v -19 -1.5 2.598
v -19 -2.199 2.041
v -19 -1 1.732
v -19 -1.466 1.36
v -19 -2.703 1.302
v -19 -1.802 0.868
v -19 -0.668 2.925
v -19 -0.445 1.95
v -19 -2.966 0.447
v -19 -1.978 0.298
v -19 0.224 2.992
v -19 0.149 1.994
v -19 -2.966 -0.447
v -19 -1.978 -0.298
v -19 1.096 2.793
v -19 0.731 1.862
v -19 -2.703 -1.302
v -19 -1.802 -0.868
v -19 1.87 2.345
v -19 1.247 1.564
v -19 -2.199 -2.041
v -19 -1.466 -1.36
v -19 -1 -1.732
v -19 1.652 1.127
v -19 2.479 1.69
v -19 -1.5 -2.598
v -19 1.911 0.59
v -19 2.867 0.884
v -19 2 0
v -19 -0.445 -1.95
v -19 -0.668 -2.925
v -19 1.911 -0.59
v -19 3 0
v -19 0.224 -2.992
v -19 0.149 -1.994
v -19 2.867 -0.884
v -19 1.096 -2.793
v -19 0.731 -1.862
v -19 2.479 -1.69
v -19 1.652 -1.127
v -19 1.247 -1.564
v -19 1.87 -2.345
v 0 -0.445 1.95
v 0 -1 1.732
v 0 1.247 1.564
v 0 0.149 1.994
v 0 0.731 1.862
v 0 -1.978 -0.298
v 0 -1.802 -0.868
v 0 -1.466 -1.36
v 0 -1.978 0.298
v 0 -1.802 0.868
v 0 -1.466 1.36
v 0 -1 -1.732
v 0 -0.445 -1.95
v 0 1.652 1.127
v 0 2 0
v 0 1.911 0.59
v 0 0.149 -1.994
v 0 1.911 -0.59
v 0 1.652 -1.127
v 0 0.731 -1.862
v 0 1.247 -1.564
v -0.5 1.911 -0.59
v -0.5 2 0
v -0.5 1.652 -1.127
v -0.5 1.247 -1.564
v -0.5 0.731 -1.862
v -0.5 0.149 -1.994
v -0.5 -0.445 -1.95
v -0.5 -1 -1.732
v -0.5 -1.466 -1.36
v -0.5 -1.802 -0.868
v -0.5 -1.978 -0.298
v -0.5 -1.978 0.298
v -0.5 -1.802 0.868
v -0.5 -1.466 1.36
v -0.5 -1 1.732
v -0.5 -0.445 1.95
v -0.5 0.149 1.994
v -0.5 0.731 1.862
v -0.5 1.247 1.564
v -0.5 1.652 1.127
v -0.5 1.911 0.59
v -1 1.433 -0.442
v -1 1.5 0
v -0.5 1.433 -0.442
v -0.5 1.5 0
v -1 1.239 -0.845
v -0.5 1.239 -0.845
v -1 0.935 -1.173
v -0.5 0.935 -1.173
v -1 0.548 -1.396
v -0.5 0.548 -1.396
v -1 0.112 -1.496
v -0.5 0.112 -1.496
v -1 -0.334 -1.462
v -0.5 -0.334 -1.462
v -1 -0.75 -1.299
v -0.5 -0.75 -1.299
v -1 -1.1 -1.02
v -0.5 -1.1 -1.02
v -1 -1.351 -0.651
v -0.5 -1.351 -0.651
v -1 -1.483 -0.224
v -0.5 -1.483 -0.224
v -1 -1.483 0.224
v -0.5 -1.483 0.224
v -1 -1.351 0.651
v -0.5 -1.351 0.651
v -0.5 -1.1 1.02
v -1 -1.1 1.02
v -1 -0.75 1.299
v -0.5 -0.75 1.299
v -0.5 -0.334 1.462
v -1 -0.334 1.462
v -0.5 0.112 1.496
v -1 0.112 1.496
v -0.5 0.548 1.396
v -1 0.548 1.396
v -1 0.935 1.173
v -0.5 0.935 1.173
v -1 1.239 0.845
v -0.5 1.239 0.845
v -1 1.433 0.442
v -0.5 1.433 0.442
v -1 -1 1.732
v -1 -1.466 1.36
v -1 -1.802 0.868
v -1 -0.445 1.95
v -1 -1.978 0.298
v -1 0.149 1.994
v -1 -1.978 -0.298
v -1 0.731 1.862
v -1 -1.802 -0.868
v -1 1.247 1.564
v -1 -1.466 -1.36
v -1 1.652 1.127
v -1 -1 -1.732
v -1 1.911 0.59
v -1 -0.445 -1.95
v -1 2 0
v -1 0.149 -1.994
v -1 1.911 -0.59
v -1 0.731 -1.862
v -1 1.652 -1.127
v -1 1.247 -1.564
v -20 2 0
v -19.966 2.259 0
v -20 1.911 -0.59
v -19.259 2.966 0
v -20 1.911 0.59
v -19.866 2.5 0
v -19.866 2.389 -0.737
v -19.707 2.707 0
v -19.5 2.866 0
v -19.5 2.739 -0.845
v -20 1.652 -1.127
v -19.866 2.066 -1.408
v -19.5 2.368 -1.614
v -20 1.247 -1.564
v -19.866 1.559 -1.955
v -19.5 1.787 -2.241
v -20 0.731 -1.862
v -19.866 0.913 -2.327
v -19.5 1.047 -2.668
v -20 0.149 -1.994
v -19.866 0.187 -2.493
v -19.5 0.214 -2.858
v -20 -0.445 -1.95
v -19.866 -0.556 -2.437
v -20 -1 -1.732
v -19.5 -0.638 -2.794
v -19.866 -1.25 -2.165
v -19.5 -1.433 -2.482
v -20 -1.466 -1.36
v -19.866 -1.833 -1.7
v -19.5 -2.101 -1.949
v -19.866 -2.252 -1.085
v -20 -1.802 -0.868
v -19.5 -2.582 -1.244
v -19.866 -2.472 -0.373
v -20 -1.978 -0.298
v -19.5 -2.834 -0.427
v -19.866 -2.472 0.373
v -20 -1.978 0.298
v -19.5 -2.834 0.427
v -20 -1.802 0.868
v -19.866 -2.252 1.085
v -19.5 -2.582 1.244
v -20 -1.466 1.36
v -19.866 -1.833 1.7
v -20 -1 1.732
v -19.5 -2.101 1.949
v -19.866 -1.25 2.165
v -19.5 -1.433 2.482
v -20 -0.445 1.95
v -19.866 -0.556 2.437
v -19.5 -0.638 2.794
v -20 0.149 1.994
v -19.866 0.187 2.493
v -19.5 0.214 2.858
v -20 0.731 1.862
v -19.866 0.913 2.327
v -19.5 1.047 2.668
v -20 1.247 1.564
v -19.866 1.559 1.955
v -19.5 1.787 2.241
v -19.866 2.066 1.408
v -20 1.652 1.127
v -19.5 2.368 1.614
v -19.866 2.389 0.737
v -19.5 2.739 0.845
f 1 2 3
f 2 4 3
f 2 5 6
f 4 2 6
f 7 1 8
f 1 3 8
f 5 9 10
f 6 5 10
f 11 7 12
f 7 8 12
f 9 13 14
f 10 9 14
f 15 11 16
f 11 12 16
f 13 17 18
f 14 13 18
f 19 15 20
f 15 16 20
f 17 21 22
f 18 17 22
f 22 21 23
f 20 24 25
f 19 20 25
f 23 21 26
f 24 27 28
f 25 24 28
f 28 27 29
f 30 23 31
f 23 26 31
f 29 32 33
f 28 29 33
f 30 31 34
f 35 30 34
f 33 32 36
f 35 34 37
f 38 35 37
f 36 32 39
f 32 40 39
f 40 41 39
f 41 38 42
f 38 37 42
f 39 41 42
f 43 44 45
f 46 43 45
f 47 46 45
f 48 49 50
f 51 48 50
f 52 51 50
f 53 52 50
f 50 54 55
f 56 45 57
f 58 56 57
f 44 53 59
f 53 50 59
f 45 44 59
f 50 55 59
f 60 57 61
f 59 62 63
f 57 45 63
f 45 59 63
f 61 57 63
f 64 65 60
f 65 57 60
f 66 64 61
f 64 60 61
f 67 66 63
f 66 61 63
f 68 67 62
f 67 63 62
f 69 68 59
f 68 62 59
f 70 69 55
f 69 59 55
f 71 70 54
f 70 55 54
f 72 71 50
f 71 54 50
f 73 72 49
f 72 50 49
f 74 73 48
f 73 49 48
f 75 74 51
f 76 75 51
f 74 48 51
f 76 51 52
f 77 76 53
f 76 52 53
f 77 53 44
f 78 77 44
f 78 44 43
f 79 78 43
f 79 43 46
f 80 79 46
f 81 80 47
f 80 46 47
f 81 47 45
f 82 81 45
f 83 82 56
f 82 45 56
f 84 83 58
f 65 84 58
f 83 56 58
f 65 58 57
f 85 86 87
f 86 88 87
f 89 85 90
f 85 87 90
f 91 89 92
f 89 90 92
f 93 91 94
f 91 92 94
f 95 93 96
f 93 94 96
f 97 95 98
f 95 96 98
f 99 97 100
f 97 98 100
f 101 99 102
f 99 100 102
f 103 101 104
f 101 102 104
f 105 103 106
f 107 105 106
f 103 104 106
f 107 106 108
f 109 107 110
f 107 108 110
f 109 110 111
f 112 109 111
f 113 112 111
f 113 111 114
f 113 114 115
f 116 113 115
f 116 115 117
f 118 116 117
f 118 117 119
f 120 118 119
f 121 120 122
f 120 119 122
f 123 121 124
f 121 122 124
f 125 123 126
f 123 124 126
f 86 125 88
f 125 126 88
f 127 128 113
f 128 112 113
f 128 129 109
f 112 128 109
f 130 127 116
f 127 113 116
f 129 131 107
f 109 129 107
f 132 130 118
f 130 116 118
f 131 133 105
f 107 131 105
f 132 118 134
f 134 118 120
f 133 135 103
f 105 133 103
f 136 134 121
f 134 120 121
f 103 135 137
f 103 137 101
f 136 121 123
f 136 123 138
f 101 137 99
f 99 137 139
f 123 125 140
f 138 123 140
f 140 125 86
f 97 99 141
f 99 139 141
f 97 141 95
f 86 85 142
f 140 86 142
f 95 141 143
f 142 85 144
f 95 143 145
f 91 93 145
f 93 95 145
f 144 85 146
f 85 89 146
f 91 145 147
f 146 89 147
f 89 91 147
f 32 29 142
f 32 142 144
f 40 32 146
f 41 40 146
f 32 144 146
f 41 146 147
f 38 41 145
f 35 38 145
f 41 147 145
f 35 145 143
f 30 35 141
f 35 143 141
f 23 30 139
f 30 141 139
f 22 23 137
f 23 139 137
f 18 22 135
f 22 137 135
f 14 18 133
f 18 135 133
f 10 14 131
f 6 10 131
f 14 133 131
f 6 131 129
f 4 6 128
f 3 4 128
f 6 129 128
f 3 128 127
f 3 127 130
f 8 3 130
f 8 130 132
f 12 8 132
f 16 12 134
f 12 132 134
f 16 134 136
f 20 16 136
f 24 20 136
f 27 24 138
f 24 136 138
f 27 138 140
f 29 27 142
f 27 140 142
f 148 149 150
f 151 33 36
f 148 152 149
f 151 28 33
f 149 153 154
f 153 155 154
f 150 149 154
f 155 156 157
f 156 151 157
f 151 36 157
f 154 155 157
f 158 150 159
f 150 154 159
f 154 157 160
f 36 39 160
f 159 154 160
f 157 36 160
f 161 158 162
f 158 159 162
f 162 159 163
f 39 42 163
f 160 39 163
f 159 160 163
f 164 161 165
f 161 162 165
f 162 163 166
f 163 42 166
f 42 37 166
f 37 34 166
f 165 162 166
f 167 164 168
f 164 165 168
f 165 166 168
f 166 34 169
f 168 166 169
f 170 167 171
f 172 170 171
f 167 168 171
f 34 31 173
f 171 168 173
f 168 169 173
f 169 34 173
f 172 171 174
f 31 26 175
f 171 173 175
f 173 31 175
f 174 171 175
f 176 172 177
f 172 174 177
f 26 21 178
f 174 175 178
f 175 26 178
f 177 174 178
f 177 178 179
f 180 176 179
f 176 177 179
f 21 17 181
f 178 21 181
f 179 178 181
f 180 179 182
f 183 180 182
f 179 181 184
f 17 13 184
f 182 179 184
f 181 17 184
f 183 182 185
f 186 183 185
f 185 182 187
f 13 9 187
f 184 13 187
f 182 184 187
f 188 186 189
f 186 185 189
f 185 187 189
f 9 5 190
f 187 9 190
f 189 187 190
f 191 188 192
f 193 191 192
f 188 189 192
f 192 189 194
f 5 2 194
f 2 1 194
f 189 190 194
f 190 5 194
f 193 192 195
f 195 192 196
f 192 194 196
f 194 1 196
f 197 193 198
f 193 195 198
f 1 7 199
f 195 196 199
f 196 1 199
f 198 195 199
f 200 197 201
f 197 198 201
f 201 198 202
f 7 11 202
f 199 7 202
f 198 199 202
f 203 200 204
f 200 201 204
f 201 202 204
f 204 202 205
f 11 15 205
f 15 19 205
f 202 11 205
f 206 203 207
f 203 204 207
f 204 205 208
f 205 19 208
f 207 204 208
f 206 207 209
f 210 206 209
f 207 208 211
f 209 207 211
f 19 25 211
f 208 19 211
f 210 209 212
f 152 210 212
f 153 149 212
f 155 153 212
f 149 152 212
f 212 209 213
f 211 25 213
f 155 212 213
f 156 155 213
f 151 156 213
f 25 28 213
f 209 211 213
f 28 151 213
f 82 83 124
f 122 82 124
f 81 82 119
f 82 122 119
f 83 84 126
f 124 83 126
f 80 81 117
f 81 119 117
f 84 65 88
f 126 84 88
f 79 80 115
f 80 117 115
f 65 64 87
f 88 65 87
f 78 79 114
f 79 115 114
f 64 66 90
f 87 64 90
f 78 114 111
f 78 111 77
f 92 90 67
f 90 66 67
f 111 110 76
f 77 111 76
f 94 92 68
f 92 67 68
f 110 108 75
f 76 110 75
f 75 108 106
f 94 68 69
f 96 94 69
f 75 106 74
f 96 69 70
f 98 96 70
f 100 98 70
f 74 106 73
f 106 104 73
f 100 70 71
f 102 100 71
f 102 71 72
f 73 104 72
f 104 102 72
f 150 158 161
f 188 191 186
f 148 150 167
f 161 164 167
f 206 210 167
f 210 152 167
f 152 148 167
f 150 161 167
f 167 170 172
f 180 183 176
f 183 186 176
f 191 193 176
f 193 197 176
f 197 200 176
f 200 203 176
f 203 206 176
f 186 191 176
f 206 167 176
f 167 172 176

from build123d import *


with BuildPart() as part:
    # Sketch1 → Revolve1 (revolve)
    with BuildSketch(Plane(origin=(0, 0, 0), x_dir=(-1, 0, 0), z_dir=(0, 0, -1))):
        with BuildLine():
            ThreePointArc((20, 2), (19.707106781, 2.707106781), (19, 3))
            Line((19, 3), (19, 2))
            Line((19, 2), (1, 2))
            Line((1, 2), (1, 1.5))
            Line((1, 1.5), (0.5, 1.5))
            Line((0.5, 1.5), (0.5, 2))
            Line((0.5, 2), (0, 2))
            Line((0, 2), (0, 0))
            Line((0, 0), (20, 0))
            Line((20, 0), (20, 2))
        make_face()
    revolve(axis=Axis((0, 0, 0), (-1, 0, 0)))


solid = part.part
